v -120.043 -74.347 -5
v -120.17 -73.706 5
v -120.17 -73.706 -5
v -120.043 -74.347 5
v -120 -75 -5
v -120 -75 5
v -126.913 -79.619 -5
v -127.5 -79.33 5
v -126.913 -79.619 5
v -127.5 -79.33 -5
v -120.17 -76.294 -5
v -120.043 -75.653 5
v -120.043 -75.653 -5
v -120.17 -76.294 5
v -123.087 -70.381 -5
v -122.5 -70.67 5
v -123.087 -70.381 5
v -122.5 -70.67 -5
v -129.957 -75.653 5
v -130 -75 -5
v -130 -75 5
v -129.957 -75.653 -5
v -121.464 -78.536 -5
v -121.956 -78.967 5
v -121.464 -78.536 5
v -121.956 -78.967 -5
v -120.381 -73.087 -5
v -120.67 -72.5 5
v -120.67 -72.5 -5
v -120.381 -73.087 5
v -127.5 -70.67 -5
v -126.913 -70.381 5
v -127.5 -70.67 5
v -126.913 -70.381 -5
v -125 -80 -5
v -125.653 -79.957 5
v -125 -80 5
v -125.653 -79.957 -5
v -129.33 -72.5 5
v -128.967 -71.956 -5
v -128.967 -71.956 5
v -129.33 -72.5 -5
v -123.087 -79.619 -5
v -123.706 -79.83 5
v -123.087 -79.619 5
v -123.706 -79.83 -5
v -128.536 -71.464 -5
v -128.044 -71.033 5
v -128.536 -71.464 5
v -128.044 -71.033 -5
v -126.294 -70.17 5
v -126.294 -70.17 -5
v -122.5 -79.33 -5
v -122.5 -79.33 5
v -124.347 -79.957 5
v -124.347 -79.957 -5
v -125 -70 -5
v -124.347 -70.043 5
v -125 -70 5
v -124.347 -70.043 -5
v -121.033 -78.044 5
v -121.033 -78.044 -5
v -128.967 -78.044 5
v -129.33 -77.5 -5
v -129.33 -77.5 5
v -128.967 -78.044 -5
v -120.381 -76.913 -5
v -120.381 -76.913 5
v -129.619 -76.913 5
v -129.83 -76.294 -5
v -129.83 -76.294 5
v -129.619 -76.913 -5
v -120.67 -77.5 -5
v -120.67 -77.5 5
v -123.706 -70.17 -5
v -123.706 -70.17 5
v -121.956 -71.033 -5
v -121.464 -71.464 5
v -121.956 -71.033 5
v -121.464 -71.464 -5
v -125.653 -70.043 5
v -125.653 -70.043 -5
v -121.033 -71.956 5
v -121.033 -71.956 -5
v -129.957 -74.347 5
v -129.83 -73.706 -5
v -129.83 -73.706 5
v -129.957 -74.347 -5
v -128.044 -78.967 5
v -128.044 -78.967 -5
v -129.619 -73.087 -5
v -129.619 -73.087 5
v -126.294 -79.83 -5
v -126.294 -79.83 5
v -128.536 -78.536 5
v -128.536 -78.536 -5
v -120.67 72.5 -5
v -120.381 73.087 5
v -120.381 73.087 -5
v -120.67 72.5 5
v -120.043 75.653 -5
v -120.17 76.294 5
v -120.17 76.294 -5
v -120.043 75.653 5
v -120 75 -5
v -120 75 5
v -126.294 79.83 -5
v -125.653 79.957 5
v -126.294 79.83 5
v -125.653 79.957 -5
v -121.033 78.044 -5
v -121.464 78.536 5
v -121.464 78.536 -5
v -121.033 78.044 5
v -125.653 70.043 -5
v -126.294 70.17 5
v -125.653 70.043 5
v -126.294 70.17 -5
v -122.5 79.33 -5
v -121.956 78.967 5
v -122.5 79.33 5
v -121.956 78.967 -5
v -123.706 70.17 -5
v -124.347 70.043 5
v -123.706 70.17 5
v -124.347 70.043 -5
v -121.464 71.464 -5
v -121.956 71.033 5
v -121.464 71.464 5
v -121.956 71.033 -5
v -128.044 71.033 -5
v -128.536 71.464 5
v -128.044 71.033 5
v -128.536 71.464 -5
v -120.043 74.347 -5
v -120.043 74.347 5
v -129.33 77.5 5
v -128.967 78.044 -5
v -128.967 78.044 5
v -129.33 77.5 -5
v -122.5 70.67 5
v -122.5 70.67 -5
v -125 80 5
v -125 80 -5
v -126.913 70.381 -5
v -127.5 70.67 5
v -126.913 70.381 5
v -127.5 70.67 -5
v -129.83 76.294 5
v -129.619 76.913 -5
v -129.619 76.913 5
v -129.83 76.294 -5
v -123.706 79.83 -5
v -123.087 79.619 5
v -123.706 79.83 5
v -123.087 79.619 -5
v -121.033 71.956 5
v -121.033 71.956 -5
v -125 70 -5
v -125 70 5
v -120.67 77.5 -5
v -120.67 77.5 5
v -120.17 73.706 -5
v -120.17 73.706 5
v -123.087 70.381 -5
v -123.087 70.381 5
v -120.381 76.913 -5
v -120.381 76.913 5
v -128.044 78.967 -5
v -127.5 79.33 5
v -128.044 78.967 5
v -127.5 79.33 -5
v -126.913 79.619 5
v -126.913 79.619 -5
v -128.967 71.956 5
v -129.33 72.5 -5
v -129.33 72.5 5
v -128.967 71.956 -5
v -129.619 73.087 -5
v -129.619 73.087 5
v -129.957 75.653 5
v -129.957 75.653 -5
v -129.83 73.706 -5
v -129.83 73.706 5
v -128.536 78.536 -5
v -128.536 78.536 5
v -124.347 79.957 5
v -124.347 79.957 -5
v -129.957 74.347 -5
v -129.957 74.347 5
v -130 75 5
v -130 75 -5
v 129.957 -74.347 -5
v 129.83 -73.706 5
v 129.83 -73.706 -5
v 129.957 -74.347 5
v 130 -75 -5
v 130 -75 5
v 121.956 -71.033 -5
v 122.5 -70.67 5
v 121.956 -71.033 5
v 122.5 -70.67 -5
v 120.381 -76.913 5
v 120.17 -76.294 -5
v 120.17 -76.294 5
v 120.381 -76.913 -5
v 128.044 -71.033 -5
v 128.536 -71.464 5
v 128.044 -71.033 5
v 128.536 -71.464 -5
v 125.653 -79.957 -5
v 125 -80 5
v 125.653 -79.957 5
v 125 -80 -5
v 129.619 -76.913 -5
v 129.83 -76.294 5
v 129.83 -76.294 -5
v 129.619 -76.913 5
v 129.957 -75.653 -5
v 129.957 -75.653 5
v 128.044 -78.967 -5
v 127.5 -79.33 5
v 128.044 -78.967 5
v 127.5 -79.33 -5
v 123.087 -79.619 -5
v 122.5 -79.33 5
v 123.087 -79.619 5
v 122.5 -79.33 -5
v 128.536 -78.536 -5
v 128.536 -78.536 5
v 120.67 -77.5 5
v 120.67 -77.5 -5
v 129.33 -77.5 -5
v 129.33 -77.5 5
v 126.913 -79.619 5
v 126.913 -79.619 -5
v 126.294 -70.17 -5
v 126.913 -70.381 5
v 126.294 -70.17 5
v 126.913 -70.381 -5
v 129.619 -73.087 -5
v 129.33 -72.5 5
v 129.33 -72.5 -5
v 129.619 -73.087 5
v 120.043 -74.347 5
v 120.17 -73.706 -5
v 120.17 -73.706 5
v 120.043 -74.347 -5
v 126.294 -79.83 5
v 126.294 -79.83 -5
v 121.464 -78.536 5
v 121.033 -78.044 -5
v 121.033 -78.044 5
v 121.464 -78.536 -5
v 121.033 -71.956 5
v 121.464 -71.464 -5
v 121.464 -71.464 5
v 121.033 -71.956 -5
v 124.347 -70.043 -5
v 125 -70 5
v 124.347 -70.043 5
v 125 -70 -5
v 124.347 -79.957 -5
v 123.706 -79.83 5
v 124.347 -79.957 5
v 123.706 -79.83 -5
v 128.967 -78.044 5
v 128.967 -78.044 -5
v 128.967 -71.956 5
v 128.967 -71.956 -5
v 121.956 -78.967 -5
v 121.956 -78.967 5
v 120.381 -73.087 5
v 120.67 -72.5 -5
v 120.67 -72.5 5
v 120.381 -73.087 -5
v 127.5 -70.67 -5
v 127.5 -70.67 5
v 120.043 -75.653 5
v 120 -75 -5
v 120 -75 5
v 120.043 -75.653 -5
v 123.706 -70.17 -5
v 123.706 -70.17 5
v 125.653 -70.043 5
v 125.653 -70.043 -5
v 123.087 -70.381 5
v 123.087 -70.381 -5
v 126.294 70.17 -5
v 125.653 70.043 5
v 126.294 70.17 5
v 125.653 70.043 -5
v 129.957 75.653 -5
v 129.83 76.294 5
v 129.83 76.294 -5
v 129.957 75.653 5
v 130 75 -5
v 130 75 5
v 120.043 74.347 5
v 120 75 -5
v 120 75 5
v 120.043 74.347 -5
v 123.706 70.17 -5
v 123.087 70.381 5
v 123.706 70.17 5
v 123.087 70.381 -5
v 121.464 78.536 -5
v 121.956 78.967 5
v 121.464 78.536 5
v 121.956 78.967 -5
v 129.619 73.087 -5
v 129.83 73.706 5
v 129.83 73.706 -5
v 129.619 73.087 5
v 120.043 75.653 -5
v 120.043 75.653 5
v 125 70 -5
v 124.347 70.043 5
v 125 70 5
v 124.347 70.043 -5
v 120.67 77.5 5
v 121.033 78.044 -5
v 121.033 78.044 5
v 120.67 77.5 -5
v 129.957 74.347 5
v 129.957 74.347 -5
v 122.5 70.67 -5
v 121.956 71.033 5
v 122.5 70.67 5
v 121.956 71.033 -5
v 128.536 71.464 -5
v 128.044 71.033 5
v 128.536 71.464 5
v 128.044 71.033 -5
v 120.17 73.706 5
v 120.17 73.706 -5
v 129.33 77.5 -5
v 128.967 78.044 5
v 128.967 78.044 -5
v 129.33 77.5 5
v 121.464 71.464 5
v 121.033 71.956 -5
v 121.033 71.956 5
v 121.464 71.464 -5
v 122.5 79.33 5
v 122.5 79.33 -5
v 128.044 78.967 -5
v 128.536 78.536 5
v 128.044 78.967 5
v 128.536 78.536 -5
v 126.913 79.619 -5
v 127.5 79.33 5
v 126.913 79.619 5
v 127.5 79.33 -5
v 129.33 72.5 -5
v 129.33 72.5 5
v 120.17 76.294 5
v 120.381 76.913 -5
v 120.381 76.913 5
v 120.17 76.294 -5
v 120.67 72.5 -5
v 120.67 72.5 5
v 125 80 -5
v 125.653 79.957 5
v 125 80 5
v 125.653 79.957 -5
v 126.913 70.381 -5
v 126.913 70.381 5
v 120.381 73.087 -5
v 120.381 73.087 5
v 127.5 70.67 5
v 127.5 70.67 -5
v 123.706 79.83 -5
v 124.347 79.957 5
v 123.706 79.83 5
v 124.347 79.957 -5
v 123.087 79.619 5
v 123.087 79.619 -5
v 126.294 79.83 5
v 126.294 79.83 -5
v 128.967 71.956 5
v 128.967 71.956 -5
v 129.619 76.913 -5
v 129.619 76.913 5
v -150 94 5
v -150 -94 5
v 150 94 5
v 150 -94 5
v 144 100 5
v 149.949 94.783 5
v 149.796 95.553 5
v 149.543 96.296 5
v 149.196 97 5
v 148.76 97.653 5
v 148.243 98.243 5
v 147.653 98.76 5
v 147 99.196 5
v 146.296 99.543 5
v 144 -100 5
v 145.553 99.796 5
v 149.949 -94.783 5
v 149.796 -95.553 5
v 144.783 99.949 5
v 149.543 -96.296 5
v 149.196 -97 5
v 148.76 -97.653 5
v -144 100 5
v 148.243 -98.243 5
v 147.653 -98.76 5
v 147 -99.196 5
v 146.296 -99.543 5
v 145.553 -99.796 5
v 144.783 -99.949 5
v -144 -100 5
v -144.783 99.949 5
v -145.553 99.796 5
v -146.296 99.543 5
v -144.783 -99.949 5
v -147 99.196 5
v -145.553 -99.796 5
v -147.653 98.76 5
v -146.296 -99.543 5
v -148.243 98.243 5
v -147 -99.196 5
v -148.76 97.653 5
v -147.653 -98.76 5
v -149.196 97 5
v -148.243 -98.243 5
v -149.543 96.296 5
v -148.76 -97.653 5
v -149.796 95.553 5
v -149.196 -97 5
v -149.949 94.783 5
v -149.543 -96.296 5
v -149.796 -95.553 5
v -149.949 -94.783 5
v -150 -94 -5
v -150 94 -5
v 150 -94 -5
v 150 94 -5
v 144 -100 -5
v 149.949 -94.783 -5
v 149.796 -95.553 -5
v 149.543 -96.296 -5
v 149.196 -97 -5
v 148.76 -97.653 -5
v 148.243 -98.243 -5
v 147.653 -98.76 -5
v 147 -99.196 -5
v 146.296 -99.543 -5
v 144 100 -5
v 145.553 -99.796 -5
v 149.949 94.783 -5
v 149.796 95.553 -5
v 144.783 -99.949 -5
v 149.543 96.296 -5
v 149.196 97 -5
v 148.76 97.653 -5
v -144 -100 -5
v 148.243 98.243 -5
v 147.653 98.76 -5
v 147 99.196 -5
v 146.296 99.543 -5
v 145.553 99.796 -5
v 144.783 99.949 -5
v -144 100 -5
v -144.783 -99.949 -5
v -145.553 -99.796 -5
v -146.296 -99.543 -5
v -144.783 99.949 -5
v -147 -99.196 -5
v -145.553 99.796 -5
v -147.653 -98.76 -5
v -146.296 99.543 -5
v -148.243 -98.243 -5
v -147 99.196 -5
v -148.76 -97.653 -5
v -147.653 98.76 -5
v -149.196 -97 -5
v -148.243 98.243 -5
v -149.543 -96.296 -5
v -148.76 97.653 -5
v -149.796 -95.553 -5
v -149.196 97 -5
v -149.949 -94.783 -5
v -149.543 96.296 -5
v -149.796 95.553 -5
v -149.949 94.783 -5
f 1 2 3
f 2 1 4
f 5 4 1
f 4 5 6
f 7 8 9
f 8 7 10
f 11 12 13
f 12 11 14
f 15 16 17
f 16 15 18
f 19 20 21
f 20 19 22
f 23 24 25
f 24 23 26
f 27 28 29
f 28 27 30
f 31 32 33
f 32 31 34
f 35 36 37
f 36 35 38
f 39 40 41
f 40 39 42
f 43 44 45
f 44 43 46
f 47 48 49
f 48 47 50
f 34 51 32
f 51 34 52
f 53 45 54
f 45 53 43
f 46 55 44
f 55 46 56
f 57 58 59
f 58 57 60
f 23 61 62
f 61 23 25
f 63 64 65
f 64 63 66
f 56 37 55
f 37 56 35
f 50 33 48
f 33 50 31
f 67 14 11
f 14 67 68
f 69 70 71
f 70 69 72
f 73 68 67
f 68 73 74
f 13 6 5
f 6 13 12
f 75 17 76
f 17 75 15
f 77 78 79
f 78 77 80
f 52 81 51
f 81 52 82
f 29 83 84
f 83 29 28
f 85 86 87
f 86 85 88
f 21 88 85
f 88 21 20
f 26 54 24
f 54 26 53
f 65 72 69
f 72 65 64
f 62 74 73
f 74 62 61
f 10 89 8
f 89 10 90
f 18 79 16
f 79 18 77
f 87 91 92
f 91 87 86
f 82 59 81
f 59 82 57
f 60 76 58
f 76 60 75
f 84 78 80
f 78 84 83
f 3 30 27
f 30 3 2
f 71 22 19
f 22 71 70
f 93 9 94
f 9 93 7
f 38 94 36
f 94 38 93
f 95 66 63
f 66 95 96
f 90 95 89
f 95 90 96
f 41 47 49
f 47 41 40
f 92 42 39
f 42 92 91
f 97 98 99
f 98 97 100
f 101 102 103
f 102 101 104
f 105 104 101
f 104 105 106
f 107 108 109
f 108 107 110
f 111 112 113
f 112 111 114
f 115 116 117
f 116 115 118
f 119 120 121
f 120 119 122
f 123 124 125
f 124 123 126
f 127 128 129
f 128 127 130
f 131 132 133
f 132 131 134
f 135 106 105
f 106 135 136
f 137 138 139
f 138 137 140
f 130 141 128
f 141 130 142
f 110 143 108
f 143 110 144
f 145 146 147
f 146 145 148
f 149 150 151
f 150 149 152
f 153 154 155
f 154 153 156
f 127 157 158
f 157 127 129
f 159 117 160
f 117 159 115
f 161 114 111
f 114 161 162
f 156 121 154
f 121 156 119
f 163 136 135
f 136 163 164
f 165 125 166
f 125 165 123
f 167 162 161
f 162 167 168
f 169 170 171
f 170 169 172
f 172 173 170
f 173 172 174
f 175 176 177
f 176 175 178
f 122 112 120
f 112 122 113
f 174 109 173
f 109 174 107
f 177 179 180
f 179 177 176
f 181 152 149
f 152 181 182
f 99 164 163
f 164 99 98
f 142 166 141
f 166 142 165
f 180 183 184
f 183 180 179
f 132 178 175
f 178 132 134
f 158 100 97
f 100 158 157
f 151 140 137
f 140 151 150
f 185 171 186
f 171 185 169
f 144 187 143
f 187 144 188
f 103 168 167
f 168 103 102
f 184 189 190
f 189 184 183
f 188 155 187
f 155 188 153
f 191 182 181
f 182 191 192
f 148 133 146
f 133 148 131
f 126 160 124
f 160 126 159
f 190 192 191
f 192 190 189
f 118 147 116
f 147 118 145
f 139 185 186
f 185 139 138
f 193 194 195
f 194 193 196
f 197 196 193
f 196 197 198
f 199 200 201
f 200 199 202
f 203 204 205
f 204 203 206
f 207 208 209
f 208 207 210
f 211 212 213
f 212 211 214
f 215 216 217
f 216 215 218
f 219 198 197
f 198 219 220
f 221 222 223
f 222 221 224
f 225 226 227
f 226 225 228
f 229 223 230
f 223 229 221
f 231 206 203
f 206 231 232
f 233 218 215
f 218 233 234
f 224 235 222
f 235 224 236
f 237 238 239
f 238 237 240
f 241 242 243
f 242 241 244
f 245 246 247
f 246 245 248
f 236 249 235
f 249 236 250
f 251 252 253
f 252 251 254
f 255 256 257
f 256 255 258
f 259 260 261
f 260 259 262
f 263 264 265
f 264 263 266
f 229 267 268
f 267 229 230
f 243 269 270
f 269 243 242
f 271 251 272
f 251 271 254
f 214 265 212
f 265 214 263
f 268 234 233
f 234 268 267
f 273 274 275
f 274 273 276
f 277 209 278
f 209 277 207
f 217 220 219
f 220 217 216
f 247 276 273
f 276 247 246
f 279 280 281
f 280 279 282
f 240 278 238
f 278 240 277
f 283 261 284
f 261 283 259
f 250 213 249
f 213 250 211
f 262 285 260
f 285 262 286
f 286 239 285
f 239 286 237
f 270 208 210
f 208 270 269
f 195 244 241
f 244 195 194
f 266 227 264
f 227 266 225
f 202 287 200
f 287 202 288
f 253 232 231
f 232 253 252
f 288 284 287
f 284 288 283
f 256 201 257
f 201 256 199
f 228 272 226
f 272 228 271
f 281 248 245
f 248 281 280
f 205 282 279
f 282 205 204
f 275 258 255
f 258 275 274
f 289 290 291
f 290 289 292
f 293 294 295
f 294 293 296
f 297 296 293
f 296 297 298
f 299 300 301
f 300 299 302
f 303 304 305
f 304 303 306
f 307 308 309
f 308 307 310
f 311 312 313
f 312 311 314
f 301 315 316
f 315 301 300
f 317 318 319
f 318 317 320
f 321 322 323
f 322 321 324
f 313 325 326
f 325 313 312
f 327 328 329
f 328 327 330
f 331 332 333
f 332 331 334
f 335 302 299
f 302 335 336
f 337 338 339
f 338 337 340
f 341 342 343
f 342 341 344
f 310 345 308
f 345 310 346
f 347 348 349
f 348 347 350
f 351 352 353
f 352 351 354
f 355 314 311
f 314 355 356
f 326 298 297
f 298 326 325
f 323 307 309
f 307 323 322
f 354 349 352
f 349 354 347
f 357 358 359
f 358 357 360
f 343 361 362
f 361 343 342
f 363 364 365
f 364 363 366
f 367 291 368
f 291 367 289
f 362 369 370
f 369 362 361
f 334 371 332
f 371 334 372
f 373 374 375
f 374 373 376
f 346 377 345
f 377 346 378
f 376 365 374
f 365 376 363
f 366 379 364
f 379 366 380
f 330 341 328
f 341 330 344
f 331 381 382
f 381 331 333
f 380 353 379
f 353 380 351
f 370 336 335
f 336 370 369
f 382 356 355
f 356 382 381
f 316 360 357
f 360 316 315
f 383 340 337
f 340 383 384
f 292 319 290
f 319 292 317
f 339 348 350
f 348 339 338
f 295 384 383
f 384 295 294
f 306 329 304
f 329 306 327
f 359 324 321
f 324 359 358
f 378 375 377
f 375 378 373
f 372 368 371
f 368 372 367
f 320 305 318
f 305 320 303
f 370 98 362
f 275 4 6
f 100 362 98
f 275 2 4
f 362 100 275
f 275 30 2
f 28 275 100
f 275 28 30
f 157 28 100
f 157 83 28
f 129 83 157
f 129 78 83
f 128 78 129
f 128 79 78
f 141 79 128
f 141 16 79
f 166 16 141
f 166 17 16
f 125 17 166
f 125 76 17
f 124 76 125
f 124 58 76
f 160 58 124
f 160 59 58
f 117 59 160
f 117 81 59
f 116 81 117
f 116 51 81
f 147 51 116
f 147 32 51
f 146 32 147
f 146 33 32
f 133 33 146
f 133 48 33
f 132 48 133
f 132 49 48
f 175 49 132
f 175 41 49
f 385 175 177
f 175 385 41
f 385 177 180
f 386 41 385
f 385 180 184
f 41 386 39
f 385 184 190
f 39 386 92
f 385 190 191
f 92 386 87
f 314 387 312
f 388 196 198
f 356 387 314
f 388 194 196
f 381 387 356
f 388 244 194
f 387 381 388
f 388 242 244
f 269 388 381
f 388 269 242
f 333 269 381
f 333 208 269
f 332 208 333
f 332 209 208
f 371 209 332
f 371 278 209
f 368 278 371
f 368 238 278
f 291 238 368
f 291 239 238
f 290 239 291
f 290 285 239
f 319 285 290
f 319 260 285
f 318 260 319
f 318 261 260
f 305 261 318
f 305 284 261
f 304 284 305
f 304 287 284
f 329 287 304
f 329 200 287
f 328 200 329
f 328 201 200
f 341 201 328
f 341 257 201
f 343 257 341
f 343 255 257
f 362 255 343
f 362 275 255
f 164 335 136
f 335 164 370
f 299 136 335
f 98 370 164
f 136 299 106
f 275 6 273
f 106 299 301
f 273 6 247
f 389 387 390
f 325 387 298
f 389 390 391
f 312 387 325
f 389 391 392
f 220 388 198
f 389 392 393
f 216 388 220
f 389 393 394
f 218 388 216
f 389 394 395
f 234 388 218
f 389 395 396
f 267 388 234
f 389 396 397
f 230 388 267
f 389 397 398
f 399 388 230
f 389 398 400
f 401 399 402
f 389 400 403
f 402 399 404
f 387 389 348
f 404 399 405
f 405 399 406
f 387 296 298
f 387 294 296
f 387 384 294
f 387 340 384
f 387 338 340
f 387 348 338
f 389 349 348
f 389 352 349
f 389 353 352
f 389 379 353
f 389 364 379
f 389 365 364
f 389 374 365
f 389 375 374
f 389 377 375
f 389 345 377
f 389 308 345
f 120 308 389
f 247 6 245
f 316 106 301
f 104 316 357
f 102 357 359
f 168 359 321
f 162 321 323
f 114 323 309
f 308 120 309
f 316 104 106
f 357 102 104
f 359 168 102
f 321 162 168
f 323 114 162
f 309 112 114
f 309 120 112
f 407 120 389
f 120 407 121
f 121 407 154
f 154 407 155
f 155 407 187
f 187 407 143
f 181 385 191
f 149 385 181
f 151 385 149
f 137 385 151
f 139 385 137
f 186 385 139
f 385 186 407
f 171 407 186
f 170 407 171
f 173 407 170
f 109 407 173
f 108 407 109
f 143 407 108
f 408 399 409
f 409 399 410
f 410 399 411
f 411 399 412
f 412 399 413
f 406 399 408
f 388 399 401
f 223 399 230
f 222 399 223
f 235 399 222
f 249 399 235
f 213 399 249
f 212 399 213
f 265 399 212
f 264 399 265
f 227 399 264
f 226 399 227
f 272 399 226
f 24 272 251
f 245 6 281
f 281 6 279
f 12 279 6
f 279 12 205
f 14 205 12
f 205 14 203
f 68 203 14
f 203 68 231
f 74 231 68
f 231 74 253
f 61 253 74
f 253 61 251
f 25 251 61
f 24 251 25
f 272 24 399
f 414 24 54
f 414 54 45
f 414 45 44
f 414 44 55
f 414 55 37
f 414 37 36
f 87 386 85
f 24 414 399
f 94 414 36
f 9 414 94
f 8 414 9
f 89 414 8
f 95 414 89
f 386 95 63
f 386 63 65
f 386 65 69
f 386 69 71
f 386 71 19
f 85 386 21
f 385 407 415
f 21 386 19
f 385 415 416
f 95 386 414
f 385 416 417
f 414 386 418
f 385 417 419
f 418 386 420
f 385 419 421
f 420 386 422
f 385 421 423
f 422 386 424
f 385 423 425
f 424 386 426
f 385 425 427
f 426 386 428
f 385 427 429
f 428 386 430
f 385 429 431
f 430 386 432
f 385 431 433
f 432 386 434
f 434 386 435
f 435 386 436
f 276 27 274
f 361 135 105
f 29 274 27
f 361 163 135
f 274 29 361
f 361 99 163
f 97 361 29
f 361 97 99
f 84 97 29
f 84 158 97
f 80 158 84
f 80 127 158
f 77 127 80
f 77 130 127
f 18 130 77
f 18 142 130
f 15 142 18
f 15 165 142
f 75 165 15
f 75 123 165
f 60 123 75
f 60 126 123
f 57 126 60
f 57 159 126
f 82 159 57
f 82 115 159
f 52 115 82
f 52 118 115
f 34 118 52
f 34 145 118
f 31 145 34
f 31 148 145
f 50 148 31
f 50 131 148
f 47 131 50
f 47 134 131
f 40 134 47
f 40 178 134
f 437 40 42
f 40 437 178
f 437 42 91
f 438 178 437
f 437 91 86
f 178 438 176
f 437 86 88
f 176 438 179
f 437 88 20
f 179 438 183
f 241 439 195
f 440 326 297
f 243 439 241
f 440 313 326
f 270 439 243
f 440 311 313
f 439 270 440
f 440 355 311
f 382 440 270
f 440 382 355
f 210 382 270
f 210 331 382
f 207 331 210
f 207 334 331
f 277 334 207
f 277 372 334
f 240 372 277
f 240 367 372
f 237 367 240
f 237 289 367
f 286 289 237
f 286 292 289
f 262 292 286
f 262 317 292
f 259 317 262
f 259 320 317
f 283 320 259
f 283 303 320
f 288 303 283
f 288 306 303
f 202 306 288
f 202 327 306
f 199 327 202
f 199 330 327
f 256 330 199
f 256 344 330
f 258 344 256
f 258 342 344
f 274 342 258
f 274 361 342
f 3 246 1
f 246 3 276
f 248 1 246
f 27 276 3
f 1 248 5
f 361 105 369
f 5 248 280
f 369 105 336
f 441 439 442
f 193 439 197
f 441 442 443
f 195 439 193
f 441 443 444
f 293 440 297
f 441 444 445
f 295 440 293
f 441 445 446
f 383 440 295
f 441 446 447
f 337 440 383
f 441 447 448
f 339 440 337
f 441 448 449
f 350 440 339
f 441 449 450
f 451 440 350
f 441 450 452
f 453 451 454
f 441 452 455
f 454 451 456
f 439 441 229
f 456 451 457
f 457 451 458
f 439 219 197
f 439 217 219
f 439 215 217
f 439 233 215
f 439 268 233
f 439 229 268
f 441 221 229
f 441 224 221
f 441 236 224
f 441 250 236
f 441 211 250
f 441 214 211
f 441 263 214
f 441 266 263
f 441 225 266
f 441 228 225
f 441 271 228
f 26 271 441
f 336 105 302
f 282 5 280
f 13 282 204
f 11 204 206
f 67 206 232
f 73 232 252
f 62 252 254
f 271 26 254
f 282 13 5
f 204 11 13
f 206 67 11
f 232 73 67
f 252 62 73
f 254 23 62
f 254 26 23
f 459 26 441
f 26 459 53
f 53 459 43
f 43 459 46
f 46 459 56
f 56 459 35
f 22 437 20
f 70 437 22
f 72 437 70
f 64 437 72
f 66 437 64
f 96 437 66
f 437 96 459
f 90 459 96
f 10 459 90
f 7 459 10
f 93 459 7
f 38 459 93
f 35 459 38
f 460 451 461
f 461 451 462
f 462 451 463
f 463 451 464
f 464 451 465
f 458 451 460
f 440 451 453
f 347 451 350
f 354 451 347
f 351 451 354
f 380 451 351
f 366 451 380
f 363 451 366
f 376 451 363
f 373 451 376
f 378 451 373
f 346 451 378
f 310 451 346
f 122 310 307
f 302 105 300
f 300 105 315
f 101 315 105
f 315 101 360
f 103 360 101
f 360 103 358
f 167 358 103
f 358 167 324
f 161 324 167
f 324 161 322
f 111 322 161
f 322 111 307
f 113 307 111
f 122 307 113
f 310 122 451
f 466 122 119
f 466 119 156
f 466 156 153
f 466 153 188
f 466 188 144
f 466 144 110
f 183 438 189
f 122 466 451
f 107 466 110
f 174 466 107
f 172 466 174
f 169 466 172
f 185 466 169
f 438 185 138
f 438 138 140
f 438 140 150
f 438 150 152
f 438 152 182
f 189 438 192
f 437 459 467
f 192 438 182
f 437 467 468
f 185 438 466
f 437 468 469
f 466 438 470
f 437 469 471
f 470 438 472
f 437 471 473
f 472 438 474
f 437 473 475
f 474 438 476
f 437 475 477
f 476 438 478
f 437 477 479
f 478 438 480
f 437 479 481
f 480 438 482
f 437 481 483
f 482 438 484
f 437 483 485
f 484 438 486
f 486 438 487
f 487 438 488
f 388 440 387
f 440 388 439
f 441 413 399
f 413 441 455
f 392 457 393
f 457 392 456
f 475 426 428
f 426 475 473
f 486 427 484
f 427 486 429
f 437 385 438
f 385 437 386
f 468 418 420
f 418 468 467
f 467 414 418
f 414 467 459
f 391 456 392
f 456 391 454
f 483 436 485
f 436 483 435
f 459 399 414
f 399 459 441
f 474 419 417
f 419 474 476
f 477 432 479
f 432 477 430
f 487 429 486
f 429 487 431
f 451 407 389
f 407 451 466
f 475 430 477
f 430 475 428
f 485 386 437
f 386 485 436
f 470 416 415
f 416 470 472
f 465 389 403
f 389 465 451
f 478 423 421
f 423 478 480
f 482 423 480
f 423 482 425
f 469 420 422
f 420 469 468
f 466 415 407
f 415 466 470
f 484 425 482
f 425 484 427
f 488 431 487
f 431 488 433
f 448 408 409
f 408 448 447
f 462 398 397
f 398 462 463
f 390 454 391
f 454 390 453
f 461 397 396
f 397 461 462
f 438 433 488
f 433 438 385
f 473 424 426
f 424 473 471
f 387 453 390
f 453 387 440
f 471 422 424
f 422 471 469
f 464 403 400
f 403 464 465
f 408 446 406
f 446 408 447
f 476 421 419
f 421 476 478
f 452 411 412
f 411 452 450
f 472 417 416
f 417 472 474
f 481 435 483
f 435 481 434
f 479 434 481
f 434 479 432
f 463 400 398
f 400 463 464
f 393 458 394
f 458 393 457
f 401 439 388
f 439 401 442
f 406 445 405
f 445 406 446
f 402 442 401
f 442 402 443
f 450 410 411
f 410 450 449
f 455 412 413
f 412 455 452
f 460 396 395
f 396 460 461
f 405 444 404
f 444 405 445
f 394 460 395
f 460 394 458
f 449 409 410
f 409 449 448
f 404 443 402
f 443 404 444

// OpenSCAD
// Aluminium tooling plate (single connected solid) - render-safe version (no minkowski)

// Parameters
plate_length = 300; //[150:600:1]
plate_width = 200;  //[100:400:1]
plate_thickness = 12; //[6:24:1]

edge_chamfer = 1;   //[0:4:0.5]   // visual chamfer amount
corner_radius = 6;  //[0:20:1]

mount_hole_diameter = 10; //[4:20:0.5]
mount_hole_edge_offset_x = 25; //[10:80:1]
mount_hole_edge_offset_y = 25; //[10:80:1]

hole_overlap = 1;   //[0.5:2:0.5]
marking_depth = 0.3; //[0.1:1:0.1]
marking_margin = 15; //[5:40:1]

$fn = 48;

// Helpers
function clamp(v, lo, hi) = v < lo ? lo : (v > hi ? hi : v);

// Keep radii/offsets valid so geometry never disappears
cr = clamp(corner_radius, 0, min(plate_length, plate_width)/2 - 0.01);
ch = clamp(edge_chamfer, 0, plate_thickness/2 - 0.01);

// 2D rounded rectangle using offset (fast) then extrude
module rounded_rect_2d(len, wid, rad) {
    if (rad <= 0) {
        square([len, wid], center=true);
    } else {
        // offset() rounds corners; shrink then expand to keep outer size
        offset(r=rad)
            offset(delta=-rad)
                square([len, wid], center=true);
    }
}

module plate_3d(len, wid, thick, rad) {
    linear_extrude(height=thick, center=true)
        rounded_rect_2d(len, wid, rad);
}

module mounting_holes() {
    hx = plate_length/2 - mount_hole_edge_offset_x;
    hy = plate_width/2  - mount_hole_edge_offset_y;

    for (sx = [-1, 1], sy = [-1, 1])
        translate([sx*hx, sy*hy, 0])
            cylinder(d=mount_hole_diameter, h=plate_thickness + 2*hole_overlap, center=true);
}

module surface_marking_cut() {
    // shallow pocket on top face
    translate([0, 0, plate_thickness/2 - marking_depth/2])
        cube([plate_length - 2*marking_margin,
              plate_width  - 2*marking_margin,
              marking_depth], center=true);
}

module chamfer_cut() {
    // subtract a slightly larger plate from top and bottom to create a chamfer-like bevel
    if (ch > 0) {
        // Top bevel
        translate([0, 0, plate_thickness/2 - ch/2])
            linear_extrude(height=ch, center=true)
                offset(delta=ch)
                    rounded_rect_2d(plate_length, plate_width, cr);

        // Bottom bevel
        translate([0, 0, -plate_thickness/2 + ch/2])
            linear_extrude(height=ch, center=true)
                offset(delta=ch)
                    rounded_rect_2d(plate_length, plate_width, cr);
    }
}

module complete_model() {
    difference() {
        plate_3d(plate_length, plate_width, plate_thickness, cr);
        mounting_holes();
        surface_marking_cut();
        chamfer_cut();
    }
}

// Final output
color("Silver") complete_model();
